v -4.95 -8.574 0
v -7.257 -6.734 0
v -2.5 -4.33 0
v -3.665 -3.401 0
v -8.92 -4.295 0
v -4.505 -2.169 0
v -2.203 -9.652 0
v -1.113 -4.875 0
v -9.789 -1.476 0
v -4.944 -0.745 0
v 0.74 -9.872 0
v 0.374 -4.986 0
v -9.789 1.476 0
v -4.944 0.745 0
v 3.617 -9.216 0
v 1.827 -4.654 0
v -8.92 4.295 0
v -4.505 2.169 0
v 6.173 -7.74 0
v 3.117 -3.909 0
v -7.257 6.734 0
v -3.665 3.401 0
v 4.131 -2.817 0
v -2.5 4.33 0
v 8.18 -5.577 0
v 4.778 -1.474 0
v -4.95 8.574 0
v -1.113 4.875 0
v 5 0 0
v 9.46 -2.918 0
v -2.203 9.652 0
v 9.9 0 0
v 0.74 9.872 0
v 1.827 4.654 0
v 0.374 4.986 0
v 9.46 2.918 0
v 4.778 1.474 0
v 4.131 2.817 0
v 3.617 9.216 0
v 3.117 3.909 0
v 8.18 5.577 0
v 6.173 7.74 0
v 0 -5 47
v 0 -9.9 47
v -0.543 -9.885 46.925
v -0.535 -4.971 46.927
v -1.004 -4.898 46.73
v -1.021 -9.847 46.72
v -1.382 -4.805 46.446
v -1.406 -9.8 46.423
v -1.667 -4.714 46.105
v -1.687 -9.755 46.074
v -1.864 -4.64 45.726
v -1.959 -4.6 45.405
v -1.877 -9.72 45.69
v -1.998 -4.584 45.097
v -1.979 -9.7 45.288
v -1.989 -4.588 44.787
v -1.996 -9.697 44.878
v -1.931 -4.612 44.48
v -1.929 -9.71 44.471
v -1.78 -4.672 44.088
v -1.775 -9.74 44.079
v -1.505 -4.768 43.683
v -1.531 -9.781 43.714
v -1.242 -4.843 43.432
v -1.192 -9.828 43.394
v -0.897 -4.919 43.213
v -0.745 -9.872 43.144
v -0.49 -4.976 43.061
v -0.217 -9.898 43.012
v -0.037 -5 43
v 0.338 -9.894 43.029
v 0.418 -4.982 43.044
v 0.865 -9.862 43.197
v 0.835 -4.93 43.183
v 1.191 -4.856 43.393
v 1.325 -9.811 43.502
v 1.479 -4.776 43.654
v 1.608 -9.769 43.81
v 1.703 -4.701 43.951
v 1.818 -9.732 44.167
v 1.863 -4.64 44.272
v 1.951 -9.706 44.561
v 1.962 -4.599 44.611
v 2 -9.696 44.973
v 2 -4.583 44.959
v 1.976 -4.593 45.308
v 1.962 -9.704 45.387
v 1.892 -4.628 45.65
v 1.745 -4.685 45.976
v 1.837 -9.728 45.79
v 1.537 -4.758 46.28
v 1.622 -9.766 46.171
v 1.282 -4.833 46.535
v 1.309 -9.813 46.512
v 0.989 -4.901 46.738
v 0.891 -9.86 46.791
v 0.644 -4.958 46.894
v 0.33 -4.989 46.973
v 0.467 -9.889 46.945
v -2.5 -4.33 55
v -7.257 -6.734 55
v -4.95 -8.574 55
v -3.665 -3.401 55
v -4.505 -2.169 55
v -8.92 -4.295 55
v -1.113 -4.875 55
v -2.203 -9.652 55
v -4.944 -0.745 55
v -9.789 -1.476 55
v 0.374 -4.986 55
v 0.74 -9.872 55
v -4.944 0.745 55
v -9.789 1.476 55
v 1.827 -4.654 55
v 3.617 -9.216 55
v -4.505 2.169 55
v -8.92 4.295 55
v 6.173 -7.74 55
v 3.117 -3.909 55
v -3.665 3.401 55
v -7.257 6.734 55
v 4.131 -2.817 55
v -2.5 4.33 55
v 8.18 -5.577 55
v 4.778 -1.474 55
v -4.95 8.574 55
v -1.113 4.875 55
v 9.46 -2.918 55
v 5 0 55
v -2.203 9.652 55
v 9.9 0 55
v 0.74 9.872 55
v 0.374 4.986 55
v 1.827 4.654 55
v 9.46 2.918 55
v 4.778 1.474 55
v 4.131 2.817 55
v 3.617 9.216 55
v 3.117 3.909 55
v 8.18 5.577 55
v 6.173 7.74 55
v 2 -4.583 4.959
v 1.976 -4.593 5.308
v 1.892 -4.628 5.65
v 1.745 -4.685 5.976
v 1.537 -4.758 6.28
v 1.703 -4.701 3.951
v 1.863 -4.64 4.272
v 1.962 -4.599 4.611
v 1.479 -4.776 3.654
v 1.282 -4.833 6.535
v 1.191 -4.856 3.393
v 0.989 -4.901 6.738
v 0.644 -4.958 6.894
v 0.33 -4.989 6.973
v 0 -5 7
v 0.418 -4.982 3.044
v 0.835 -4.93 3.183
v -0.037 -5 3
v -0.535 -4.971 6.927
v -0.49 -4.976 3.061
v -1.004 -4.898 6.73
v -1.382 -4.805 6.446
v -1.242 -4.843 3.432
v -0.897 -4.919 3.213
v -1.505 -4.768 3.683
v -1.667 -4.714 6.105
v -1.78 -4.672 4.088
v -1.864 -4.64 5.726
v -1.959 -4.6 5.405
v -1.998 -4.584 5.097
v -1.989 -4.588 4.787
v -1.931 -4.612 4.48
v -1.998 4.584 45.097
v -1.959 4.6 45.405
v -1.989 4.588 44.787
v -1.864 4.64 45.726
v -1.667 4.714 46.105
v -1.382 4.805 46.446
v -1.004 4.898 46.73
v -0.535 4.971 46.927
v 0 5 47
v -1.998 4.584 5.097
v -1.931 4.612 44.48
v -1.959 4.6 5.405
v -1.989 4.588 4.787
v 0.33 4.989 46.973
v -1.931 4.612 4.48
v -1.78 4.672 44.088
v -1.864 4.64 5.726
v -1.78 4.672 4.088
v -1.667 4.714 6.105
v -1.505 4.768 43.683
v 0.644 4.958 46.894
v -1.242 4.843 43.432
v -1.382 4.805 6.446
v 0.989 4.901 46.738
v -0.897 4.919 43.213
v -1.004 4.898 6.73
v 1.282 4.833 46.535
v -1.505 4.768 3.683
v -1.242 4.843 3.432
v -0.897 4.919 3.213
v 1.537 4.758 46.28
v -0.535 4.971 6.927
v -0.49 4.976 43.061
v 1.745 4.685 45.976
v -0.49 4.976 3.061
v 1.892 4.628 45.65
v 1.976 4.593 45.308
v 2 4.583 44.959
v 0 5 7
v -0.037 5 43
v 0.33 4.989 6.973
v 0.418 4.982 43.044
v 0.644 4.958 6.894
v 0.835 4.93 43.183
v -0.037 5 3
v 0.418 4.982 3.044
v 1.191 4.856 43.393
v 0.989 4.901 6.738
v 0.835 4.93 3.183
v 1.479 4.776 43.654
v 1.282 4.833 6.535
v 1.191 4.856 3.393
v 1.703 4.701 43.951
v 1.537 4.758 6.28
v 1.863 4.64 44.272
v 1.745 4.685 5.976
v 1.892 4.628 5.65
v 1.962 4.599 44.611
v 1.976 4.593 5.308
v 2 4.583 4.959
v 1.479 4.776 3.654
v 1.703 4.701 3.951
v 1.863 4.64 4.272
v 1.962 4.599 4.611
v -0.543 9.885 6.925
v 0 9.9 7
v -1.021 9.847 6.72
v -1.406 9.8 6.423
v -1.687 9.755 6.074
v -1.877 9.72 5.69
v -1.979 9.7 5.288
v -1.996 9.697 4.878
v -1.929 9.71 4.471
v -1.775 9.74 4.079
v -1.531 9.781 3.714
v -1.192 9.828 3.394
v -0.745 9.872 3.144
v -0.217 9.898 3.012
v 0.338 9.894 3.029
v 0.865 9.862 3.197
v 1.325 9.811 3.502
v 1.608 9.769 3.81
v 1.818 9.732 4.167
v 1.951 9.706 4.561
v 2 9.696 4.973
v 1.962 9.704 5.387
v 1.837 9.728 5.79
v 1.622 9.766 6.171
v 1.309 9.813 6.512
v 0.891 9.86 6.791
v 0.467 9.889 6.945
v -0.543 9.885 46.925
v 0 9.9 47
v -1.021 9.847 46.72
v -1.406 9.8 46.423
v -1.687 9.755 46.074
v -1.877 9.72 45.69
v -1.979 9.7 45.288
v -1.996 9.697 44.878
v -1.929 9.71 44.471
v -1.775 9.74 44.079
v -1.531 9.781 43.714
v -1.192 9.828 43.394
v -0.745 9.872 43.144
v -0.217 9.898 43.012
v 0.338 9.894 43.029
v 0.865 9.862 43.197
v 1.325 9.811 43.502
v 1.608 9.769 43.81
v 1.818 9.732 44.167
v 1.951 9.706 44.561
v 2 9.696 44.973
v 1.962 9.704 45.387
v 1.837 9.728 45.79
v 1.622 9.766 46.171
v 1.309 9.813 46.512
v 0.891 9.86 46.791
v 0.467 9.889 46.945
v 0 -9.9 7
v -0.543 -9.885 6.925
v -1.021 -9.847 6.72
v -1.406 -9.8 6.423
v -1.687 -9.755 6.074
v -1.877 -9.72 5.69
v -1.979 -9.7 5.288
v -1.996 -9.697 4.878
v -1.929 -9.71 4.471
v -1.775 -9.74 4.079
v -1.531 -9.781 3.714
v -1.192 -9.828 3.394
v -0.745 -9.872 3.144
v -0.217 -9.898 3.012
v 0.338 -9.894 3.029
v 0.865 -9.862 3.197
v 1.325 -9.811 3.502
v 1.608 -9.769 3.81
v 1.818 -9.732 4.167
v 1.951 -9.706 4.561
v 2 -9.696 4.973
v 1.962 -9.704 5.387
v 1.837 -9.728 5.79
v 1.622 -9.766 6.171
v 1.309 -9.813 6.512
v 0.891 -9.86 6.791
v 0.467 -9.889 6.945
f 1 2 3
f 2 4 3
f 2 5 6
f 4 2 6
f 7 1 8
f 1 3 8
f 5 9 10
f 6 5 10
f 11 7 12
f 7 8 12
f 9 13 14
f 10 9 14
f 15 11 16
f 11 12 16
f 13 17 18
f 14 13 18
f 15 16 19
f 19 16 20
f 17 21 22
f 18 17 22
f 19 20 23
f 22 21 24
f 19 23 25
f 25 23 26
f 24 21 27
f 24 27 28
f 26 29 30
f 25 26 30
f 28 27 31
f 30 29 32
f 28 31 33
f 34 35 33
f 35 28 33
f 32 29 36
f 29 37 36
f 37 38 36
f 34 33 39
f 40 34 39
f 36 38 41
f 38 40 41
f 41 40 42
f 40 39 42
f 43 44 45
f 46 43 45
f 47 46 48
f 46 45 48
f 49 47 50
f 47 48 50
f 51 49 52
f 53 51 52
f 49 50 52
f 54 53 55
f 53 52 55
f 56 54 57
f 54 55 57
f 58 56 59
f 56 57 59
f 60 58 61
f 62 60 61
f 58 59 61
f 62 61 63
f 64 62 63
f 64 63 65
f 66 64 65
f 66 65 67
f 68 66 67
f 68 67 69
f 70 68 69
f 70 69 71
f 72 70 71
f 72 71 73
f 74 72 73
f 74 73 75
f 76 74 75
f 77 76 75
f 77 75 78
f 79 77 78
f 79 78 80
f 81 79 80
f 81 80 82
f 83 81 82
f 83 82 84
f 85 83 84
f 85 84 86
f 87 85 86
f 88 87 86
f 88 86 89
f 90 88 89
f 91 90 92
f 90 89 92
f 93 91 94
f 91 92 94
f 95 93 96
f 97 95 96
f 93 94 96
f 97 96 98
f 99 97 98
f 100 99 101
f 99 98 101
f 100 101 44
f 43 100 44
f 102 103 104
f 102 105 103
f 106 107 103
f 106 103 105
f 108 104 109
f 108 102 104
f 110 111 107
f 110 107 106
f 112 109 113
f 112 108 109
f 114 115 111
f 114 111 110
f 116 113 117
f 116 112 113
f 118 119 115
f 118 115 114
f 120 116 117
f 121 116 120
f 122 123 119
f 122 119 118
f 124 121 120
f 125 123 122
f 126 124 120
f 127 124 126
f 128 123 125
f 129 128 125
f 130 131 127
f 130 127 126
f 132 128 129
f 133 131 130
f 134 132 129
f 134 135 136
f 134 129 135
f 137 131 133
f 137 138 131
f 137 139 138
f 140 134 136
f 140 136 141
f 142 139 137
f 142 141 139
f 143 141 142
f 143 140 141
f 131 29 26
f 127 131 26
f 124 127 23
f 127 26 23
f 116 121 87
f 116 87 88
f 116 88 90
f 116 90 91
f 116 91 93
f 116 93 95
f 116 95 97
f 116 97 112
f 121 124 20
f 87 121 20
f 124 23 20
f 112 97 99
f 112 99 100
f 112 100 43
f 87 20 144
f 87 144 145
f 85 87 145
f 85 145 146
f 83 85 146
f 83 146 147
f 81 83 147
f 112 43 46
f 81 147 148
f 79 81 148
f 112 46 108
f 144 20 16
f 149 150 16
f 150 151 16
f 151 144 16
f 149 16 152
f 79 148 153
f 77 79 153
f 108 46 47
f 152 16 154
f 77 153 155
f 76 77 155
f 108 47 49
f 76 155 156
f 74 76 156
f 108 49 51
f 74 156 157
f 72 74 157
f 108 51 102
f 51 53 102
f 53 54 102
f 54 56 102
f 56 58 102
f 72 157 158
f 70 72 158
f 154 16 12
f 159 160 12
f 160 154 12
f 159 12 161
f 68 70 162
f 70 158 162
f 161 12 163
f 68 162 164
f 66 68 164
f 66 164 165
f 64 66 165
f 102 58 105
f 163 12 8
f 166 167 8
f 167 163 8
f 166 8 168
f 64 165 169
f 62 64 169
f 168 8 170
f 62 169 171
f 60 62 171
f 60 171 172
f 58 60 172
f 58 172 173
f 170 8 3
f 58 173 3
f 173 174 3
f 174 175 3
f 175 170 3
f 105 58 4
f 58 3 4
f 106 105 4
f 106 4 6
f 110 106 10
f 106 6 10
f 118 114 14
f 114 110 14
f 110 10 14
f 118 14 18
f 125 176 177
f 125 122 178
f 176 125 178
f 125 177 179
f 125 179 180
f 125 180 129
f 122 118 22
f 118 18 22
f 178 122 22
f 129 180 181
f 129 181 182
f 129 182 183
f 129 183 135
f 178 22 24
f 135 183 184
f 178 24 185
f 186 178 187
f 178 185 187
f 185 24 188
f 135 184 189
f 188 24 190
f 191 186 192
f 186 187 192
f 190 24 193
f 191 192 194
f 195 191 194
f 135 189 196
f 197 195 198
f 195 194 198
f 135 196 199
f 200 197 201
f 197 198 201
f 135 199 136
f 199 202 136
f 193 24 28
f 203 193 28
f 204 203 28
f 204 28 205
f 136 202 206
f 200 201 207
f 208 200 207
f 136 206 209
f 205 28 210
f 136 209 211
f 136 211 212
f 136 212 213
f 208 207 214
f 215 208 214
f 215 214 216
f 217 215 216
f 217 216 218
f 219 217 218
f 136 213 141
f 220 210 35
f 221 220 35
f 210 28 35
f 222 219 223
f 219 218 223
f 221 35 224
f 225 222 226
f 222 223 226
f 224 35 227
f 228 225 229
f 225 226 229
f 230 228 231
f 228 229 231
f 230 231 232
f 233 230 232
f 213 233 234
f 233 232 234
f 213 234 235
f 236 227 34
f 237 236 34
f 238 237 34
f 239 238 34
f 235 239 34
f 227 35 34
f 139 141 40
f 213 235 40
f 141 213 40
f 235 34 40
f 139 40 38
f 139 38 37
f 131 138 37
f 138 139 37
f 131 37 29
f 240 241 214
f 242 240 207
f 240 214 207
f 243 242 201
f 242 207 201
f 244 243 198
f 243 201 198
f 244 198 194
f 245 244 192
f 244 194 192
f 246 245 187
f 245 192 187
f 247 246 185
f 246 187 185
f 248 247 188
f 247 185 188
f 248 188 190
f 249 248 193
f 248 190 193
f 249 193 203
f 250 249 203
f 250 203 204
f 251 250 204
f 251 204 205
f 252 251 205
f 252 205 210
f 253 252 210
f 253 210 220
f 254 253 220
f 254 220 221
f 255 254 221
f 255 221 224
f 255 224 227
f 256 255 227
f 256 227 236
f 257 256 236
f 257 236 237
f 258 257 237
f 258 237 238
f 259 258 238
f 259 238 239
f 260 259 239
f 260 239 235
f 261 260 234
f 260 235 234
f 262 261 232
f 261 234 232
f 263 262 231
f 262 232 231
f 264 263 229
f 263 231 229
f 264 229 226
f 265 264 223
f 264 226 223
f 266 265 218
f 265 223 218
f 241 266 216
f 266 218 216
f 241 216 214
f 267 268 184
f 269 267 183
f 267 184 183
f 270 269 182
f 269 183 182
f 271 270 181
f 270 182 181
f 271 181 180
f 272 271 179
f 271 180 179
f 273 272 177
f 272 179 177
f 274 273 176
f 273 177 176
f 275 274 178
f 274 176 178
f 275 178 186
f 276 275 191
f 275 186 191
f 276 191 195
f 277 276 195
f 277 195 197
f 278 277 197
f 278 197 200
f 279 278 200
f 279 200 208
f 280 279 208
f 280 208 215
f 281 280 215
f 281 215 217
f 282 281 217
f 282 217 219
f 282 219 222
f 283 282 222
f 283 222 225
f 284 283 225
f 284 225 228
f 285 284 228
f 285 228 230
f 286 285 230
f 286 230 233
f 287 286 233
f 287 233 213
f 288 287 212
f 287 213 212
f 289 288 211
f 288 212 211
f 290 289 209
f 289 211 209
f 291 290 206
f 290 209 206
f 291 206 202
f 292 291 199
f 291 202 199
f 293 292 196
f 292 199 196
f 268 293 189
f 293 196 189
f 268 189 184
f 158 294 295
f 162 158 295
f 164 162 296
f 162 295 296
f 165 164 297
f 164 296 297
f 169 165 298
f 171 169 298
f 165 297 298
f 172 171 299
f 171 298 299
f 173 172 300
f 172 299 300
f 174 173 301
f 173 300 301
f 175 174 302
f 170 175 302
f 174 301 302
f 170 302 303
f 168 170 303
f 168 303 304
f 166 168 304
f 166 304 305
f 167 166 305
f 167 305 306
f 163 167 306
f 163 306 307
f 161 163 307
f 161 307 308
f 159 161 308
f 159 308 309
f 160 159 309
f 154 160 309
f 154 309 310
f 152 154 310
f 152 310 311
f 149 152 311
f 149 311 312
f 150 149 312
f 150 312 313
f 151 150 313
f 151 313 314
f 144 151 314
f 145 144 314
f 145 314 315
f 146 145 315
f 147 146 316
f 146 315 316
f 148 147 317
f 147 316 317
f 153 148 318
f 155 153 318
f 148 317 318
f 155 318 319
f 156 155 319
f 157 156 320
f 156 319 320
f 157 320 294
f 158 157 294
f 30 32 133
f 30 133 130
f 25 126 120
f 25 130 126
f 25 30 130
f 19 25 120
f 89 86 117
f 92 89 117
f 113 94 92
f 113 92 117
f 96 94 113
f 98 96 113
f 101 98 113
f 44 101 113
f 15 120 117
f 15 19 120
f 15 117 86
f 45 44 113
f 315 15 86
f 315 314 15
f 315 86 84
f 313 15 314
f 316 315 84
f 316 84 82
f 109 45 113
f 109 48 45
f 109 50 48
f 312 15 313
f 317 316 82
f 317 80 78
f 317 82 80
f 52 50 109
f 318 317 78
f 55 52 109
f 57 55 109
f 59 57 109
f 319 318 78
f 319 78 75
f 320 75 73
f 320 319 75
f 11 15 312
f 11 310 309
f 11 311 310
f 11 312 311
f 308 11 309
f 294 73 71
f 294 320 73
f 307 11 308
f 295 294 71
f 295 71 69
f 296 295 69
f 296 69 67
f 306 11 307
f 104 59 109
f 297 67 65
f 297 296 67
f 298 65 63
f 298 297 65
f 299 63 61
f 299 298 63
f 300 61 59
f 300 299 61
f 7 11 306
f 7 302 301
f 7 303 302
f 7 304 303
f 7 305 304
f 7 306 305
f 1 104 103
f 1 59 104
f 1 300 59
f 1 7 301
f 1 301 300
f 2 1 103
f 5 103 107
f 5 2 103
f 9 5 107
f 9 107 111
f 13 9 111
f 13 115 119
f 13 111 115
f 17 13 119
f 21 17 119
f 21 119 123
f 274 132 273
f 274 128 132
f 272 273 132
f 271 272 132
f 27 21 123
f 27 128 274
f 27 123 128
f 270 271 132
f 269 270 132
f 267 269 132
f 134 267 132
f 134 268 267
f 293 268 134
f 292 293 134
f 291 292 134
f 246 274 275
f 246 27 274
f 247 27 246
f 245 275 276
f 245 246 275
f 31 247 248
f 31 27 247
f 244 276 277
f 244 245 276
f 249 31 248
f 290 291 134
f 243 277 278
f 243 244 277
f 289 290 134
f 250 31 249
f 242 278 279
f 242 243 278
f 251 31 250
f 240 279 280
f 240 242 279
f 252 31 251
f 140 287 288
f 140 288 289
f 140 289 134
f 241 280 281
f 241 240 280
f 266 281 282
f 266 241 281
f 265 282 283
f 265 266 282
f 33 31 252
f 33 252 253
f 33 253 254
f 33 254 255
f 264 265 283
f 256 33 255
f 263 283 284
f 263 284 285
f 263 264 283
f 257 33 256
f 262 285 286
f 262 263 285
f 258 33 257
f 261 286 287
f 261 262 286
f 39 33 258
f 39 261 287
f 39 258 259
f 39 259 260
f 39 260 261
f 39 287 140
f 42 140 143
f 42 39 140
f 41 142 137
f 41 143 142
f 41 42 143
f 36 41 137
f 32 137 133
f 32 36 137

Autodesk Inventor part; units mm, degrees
ref_plane "YZ Plane" through (0, 0, 0) normal (1, 0, 0) x (0, 1, 0)
ref_plane "XZ Plane" through (0, 0, 0) normal (0, 1, 0) x (-1, 0, 0)
ref_plane "XY Plane" through (0, 0, 0) normal (0, 0, 1) x (1, 0, 0)
sketch "Esquisse1" plane through (0, 0, 0) normal (0, 0, 1) x (1, 0, 0)
  circle A0 centre (0, 0) radius 9.9
  circle A1 centre (0, 0) radius 5
  dimension "d0" = 19.8
  dimension "d1" = 10
extrude "Extrusion1" add sketch "Esquisse1" along normal blind 50
sketch "Esquisse2" plane through (0, 0, 0) normal (0, 1, 0) x (-1, 0, 0)
  line L0 (0, 0) -> (0, 5)
  line L1 (9.9, 50) -> (-9.9, 50) projected
  line L2 (0, 50) -> (0, 45)
  dimension "d4" = 5
  dimension "d5" = 5
hole "Perçage1" at (0, 0, 5) at (0, 0, 45) direction (0, -1, 0) diameter 4 end through all both
sketch "Esquisse3" plane through (0, 0, 50) normal (0, 0, 1) x (1, 0, 0)
  circle A0 centre (0, 0) radius 9.9 projected
  circle A1 centre (0, 0) radius 5 projected
sketch "Esquisse4" plane through (0, 0, 50) normal (0, 0, 1) x (1, 0, 0)
  point P0 (0, 0)
extrude "Extrusion2" add sketch "Esquisse3" along normal blind 5
properties part number "tube vers bogie"
